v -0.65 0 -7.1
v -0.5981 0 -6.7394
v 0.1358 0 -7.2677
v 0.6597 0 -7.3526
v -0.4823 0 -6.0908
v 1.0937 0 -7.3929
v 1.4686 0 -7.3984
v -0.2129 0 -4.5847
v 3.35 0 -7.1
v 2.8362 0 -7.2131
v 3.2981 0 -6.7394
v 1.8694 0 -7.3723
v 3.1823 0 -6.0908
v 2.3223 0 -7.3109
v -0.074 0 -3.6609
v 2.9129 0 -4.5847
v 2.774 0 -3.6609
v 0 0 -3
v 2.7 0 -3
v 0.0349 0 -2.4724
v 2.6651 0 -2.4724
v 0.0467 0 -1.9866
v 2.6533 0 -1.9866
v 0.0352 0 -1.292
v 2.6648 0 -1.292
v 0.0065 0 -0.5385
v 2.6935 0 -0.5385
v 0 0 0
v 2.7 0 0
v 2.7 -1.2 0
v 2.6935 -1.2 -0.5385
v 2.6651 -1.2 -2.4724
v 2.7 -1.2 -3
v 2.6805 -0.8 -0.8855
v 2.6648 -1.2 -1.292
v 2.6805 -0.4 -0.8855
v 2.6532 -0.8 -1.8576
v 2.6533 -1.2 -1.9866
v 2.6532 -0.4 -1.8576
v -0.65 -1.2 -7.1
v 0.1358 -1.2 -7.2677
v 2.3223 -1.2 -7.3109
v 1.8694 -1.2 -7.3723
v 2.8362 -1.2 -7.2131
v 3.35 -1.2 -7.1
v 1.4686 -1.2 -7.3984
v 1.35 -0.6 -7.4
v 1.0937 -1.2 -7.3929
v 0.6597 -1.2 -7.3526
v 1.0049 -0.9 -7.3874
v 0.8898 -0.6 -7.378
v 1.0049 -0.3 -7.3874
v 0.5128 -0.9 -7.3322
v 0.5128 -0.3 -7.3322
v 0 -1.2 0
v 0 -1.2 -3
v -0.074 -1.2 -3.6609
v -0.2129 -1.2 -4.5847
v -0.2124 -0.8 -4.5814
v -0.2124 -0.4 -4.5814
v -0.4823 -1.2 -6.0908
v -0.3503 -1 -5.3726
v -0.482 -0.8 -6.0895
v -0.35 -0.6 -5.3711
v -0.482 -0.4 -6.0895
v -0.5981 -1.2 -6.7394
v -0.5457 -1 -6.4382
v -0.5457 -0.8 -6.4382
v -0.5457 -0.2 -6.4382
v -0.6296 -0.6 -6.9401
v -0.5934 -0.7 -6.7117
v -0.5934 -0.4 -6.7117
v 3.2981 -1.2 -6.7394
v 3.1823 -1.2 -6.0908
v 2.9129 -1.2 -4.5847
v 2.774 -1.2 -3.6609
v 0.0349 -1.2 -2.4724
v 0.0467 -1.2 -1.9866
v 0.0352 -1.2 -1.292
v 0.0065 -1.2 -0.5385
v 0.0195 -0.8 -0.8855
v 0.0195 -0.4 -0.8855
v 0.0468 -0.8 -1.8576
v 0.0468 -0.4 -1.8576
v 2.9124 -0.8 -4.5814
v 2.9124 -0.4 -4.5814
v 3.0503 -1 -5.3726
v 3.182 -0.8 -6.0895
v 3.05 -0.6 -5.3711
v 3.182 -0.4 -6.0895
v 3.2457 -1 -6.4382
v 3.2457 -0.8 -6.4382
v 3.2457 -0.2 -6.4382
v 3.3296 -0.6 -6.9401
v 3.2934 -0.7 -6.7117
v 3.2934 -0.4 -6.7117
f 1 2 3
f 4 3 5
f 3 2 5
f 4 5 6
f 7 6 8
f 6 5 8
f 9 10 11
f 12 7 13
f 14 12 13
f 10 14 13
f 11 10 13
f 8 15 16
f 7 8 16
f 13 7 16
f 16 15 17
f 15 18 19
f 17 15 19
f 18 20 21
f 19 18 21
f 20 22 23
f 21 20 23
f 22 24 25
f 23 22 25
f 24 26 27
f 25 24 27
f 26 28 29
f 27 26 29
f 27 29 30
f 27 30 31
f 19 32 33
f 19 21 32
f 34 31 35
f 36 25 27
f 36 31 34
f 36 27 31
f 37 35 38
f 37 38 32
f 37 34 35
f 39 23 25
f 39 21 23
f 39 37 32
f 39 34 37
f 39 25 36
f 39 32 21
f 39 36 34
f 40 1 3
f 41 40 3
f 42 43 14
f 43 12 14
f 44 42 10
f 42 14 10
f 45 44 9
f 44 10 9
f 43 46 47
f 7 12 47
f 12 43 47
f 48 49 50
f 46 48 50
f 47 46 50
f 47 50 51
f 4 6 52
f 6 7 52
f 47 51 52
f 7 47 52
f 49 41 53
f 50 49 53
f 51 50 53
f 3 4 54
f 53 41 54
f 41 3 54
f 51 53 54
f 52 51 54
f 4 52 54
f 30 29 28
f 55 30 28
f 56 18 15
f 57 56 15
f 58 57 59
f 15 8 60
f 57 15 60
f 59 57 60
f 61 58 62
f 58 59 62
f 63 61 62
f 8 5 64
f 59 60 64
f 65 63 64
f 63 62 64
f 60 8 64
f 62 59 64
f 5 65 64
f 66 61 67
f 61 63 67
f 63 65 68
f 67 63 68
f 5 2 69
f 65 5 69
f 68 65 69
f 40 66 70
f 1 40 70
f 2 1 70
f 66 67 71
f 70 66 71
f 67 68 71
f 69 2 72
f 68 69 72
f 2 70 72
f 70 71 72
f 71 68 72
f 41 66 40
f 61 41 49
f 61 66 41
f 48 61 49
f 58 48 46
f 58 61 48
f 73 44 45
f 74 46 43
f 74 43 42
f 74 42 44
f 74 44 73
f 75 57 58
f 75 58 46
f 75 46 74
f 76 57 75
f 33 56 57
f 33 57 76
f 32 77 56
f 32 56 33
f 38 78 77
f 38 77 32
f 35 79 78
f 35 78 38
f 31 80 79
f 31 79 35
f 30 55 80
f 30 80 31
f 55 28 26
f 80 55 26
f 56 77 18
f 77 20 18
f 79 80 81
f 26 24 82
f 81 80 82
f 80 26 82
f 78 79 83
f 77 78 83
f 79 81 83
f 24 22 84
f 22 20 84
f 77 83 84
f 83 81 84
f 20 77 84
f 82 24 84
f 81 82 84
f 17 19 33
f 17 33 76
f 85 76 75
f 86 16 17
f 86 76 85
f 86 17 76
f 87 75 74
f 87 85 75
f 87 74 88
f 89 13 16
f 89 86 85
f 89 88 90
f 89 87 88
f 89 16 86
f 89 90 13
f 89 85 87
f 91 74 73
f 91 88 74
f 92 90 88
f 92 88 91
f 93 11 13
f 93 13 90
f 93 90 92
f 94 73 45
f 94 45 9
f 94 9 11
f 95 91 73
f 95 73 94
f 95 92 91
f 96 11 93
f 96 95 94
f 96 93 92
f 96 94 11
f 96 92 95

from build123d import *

# Parameters (mm, degrees)
F1_DEPTH = 1.2


with BuildPart() as f1:
    # F0 (on Front) → F1 (new body)
    with BuildSketch(Plane.XZ):
        with BuildLine():
            Line((1.35, 0), (0, 0))
            add(Edge.make_bspline(
                [(0, 0), (-0.0118428651, -0.8699247142), (0.1112151057, -1.7447327255), (0, -3)],
                knots=[0, 0, 0, 0, 0.4011955023, 0.4011955023, 0.4011955023, 0.4011955023], degree=3))
            Line((0, -3), (1.35, -3))
            Line((1.35, -3), (1.35, 0))
        make_face()
        with BuildLine():
            Line((2.7, 0), (1.35, 0))
            Line((1.35, 0), (1.35, -3))
            Line((1.35, -3), (2.7, -3))
            add(Edge.make_bspline(
                [(2.7, 0), (2.7118428651, -0.8699247142), (2.5887848943, -1.7447327255), (2.7, -3)],
                knots=[0, 0, 0, 0, 0.4011955023, 0.4011955023, 0.4011955023, 0.4011955023], degree=3))
        make_face()
        with BuildLine():
            Line((1.35, -3), (0, -3))
            add(Edge.make_bspline(
                [(0, -3), (-0.1308248434, -4.4765992759), (-0.5858215146, -6.4796533053), (-0.65, -7.1)],
                knots=[0.4011955023, 0.4011955023, 0.4011955023, 0.4011955023, 0.8731308426, 0.8731308426, 0.8731308426, 0.8731308426], degree=3))
            add(Edge.make_bspline(
                [(-0.65, -7.1), (0.0166666667, -7.25), (1.35, -7.55), (2.6833333333, -7.25), (3.35, -7.1)],
                knots=[0, 0, 0, 0, 0.5, 1, 1, 1, 1], degree=3))
            add(Edge.make_bspline(
                [(2.7, -3), (2.8308248434, -4.4765992759), (3.2858215146, -6.4796533053), (3.35, -7.1)],
                knots=[0.4011955023, 0.4011955023, 0.4011955023, 0.4011955023, 0.8731308426, 0.8731308426, 0.8731308426, 0.8731308426], degree=3))
            Line((2.7, -3), (1.35, -3))
        make_face()
    extrude(amount=F1_DEPTH)


solid = f1.part
